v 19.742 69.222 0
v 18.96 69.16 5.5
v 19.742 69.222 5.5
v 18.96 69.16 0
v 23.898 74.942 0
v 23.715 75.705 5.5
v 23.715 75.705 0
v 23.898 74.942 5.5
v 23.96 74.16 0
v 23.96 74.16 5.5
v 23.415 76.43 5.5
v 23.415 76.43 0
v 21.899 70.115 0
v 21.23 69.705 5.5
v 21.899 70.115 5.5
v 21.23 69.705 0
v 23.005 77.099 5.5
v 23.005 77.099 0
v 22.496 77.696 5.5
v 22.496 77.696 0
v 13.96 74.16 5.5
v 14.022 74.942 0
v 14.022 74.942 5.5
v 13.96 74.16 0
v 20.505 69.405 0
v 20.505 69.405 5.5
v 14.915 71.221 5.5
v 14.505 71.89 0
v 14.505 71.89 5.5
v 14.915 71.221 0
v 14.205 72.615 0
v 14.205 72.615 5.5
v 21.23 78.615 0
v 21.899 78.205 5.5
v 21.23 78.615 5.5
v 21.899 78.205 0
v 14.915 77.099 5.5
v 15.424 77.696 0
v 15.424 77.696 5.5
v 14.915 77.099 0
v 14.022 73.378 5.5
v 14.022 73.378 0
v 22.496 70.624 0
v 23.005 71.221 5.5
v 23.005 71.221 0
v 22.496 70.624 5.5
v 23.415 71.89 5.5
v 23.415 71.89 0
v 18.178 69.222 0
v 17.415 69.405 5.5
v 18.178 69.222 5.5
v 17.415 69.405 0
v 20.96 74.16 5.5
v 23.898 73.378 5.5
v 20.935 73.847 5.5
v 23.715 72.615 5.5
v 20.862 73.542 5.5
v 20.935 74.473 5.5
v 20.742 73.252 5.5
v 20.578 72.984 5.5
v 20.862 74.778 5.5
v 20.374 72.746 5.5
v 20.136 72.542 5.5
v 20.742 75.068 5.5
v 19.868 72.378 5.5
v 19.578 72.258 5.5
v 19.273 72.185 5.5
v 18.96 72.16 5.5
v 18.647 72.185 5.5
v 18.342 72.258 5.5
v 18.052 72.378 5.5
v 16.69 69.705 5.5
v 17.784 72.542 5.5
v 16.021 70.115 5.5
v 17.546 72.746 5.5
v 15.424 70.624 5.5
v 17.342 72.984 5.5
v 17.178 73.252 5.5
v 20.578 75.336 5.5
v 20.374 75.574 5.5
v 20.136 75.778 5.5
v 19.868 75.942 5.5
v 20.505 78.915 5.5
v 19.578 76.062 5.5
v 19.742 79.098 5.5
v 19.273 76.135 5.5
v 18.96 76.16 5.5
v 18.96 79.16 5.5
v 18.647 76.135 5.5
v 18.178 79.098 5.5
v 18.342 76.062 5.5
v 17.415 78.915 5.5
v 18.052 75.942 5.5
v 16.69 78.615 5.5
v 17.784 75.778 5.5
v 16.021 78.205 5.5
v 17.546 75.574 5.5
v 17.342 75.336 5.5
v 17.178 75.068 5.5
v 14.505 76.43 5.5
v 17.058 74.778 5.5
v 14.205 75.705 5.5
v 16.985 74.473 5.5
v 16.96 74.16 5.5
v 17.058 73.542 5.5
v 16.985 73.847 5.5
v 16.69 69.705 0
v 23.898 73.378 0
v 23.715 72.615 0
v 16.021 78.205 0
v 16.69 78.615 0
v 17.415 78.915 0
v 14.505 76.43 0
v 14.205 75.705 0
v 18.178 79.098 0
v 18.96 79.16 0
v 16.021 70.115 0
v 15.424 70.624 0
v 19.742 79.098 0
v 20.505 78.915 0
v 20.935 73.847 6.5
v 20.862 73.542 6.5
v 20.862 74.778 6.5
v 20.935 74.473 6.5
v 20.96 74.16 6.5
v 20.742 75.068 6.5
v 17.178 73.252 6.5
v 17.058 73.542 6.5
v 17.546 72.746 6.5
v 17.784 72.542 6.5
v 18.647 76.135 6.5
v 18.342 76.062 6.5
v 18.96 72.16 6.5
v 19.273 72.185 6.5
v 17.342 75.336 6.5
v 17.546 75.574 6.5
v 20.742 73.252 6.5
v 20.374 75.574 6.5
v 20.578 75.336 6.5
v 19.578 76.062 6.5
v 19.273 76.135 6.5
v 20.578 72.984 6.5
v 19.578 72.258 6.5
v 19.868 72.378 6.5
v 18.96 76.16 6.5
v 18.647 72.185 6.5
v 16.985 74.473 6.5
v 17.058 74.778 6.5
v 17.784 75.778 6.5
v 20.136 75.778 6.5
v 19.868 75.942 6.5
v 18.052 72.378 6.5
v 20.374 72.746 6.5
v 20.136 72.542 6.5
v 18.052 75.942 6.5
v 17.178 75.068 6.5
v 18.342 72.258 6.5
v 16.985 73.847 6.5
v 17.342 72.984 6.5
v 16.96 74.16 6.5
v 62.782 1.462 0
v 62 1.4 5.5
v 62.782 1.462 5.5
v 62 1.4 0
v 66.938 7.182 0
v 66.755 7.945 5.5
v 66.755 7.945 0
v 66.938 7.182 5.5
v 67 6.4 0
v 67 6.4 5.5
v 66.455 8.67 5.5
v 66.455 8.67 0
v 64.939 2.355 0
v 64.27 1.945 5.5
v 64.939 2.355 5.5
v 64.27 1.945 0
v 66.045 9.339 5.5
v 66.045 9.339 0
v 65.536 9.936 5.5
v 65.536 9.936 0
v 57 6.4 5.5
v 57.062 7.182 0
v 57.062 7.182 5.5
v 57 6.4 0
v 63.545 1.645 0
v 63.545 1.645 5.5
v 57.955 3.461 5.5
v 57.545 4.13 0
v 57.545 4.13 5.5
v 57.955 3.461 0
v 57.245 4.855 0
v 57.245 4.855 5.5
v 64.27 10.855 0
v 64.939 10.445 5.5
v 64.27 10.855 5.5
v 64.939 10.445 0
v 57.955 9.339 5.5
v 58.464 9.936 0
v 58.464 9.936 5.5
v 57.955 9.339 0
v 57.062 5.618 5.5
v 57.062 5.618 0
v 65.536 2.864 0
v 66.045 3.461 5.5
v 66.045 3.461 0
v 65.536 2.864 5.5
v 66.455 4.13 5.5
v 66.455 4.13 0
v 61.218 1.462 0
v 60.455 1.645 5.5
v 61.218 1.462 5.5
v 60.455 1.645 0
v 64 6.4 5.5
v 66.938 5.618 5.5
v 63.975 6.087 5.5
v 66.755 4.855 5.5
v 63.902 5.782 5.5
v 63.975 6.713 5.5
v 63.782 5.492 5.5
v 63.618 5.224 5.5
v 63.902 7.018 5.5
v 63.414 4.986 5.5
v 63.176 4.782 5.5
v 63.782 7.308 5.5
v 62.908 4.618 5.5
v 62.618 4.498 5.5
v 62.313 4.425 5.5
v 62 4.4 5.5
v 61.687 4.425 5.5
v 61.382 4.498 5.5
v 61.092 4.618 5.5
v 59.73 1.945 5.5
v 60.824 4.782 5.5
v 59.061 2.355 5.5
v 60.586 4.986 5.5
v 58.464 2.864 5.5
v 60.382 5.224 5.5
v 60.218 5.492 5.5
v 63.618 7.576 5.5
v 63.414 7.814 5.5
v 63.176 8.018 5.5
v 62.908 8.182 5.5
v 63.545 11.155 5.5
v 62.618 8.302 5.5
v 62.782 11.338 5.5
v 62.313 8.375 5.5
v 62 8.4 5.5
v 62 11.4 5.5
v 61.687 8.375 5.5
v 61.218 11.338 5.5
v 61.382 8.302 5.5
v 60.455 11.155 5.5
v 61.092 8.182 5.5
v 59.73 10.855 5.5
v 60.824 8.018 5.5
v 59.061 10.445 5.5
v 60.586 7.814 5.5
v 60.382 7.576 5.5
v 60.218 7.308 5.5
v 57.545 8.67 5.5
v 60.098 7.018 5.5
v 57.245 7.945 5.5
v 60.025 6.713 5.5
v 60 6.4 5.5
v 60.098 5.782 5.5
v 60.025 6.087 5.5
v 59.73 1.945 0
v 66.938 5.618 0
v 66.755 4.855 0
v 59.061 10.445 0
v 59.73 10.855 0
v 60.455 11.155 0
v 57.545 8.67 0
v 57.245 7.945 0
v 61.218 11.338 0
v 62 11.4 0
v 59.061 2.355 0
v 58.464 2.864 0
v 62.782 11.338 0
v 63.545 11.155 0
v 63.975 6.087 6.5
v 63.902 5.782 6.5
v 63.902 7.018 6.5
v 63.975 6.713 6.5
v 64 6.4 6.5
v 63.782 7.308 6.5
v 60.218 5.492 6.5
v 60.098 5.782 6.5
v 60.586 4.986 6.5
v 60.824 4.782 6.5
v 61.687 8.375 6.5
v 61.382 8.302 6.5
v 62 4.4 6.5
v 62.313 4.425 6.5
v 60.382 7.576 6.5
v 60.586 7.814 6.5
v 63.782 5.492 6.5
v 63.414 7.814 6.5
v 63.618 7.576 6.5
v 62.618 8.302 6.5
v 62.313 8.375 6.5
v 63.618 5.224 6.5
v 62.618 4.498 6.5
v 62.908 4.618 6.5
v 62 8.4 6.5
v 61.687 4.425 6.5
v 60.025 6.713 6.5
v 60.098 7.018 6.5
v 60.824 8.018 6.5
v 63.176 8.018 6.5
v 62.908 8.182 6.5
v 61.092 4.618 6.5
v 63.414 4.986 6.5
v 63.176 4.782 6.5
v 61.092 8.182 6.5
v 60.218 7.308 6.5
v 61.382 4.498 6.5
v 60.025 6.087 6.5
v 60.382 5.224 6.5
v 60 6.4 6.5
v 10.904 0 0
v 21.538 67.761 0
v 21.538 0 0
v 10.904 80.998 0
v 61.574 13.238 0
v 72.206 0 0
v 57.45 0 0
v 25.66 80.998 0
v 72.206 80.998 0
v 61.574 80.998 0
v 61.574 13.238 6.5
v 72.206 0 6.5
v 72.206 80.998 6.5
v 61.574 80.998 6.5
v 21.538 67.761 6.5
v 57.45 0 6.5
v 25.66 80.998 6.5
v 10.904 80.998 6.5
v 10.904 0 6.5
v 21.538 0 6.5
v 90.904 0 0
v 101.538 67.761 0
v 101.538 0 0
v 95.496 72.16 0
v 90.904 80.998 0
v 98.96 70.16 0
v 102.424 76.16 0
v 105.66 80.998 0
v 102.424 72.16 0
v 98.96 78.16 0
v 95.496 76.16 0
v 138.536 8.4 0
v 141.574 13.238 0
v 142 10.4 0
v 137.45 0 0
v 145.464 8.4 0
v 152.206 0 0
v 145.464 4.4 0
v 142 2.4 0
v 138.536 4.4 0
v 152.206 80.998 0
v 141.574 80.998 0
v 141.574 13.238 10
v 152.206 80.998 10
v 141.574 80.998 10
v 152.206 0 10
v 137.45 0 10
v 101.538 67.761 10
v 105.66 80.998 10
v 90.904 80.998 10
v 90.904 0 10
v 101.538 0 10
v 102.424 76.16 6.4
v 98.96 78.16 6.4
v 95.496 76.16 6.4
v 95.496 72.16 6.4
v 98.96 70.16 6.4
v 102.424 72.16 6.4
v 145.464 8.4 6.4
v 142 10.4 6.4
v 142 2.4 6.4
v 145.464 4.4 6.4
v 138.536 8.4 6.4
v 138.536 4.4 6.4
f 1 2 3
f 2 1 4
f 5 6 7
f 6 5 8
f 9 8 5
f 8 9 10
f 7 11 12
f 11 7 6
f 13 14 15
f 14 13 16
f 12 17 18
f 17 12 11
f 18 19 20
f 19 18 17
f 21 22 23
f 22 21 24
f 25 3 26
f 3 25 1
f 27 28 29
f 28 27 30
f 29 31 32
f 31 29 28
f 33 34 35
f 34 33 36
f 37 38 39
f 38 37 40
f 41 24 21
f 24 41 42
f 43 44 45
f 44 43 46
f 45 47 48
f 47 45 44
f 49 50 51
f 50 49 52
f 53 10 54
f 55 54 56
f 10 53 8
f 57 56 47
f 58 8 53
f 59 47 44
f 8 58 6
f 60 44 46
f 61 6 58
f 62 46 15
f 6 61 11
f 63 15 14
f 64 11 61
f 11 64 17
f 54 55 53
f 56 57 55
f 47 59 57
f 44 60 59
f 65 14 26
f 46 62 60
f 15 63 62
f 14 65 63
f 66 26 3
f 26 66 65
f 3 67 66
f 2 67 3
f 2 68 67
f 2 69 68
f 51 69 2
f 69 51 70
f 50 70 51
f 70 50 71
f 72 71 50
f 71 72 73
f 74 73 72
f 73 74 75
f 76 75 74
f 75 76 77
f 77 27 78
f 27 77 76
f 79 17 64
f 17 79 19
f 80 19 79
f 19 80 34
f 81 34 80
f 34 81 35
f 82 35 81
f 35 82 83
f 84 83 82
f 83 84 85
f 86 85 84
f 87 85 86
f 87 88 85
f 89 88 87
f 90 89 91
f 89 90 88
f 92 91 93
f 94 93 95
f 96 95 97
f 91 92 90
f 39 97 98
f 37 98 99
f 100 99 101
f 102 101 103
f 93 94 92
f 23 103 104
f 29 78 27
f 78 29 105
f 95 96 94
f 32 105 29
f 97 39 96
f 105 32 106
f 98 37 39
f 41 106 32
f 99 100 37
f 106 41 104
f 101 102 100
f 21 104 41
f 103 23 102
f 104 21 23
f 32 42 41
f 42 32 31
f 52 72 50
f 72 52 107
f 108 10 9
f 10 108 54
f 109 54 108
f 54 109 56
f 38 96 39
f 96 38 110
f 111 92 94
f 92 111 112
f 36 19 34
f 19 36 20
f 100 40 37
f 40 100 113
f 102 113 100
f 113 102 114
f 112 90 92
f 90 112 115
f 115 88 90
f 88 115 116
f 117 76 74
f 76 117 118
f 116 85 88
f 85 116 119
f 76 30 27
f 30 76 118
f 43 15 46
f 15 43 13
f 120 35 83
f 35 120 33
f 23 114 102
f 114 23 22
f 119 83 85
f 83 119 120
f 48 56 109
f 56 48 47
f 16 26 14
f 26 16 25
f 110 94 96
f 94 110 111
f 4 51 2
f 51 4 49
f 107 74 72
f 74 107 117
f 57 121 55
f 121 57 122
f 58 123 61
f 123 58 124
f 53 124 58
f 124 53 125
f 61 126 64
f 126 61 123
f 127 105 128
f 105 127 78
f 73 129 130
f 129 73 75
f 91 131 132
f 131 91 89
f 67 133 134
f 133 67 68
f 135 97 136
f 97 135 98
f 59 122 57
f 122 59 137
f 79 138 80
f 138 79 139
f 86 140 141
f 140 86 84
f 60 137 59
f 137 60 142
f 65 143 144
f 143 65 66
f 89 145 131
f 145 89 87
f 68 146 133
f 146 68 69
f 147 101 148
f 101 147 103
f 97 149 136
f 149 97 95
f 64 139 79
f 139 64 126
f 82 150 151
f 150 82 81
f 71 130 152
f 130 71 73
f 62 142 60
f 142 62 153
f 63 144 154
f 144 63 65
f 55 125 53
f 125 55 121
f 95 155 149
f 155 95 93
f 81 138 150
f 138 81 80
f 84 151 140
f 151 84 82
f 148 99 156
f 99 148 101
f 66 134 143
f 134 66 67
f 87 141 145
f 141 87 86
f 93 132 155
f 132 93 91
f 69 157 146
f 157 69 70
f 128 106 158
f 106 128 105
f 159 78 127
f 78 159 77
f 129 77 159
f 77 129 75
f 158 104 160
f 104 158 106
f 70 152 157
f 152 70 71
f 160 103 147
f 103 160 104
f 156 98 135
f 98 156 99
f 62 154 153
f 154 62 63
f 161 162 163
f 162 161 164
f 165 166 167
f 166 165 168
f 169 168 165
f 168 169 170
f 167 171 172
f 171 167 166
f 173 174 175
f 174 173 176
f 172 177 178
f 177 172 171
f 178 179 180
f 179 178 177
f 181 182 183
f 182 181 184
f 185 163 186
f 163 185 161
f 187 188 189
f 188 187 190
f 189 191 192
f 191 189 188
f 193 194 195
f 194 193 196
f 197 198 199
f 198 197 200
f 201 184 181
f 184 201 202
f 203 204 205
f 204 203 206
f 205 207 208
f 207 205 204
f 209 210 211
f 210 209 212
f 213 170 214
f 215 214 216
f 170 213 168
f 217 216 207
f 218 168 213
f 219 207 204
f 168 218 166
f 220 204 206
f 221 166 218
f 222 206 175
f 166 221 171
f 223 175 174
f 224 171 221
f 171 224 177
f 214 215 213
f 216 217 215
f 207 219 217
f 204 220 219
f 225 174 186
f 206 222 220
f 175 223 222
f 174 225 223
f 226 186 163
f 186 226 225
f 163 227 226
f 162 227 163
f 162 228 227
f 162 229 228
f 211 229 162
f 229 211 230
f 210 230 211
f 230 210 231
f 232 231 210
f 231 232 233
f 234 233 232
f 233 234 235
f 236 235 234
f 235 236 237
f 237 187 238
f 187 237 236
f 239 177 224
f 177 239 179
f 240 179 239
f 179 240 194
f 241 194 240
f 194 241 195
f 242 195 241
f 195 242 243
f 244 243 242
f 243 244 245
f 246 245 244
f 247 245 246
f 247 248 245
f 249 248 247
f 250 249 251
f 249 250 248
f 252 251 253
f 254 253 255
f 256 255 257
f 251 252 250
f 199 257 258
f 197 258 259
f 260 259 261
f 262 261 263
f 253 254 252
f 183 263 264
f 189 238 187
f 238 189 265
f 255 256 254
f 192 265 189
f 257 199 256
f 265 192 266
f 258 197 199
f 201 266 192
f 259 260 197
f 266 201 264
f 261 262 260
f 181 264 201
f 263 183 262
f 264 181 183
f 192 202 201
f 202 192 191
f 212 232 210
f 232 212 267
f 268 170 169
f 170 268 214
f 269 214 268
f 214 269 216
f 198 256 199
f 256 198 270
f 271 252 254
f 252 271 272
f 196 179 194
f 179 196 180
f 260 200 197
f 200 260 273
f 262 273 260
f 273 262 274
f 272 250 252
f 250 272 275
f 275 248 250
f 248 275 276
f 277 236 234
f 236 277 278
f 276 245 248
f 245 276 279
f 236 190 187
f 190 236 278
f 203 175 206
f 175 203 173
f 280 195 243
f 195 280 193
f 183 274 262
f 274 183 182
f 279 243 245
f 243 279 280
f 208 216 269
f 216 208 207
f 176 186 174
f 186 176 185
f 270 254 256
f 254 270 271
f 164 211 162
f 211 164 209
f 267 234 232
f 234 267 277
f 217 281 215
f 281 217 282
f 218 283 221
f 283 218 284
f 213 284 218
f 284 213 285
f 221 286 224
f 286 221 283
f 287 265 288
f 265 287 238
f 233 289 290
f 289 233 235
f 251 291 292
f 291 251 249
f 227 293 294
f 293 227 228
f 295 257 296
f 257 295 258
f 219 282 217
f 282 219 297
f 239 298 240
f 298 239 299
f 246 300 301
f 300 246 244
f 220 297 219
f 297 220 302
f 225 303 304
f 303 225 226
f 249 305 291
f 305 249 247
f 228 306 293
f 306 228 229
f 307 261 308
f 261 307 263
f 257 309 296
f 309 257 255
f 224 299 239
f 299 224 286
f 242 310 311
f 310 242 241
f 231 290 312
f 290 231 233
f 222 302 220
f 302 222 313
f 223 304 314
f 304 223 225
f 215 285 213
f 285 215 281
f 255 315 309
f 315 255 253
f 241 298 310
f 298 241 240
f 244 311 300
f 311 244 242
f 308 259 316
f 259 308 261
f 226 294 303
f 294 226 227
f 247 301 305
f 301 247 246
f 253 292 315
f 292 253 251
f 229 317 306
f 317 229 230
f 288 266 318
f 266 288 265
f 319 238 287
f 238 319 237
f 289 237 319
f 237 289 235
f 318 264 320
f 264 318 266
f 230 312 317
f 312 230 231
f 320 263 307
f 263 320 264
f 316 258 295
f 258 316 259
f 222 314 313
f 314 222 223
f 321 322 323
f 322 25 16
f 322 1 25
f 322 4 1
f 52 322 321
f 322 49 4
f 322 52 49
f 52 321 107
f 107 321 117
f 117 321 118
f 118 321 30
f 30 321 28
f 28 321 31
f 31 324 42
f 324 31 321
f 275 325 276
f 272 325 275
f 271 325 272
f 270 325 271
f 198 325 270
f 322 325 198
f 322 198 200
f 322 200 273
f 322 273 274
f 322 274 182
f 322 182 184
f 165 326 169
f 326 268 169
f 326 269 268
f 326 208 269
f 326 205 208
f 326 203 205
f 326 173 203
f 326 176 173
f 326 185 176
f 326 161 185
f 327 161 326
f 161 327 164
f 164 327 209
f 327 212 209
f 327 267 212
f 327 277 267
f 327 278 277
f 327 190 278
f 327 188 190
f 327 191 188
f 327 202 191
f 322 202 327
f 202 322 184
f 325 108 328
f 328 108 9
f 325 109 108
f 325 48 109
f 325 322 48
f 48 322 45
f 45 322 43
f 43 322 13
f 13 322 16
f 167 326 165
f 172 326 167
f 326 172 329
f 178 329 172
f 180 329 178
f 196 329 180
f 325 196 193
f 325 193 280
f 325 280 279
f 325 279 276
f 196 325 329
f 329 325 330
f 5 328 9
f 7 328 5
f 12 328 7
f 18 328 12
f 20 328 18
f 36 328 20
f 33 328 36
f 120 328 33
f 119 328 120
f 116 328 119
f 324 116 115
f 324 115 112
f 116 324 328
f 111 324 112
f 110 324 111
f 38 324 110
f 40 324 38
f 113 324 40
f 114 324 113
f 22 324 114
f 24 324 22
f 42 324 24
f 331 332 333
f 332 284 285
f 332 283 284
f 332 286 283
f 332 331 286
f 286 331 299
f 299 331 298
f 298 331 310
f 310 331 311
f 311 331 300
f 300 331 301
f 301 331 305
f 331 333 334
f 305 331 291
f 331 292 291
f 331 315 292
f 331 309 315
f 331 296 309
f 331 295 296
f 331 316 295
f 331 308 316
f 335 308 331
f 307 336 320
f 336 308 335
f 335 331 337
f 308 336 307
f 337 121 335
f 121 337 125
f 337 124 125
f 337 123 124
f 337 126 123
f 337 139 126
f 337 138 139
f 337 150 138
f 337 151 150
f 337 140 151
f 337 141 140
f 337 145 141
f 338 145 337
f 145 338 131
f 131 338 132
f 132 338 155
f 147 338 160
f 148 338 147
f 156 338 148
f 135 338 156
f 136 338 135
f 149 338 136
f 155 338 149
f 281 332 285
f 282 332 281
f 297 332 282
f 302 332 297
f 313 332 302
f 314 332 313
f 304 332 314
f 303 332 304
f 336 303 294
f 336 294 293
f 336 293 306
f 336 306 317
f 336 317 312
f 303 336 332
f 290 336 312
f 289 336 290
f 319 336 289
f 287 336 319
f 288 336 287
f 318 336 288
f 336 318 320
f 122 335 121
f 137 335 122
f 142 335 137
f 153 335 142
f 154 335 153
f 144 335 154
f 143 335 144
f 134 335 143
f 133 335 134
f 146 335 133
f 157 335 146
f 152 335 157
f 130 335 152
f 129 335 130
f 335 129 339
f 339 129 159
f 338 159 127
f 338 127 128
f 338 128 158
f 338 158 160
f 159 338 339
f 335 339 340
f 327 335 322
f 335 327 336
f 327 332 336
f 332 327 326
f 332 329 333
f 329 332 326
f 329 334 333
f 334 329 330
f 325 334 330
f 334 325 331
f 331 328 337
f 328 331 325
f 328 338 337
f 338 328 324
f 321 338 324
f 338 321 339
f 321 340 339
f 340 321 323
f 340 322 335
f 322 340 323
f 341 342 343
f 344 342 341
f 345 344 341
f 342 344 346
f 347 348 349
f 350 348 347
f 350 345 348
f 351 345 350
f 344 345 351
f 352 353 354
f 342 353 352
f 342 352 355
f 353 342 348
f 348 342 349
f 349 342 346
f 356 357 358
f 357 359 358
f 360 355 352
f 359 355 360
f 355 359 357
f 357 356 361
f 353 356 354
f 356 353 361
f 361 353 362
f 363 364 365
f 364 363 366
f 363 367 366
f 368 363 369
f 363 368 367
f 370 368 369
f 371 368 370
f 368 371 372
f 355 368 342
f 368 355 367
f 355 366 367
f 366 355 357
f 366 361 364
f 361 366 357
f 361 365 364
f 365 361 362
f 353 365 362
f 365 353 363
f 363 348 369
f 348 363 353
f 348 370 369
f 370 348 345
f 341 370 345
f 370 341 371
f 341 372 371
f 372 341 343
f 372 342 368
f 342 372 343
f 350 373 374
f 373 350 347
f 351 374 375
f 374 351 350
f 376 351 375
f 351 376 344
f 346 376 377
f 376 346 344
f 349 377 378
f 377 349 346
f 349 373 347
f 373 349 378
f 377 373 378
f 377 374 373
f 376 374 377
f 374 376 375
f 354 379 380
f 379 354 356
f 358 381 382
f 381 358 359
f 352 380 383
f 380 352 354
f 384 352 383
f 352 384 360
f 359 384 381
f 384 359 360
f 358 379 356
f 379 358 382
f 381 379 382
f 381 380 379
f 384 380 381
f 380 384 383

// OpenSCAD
wall           =  1;
text_size      = 80;
//text_font      = "Liberation Sans:style=Bold";
text_font      = "Calibre";

magnet_height1 =   4.5;
magnet_height2 =  12.5;
magnet_diam    =  10;
screw_diam     =   4;
nut_height     =   3.2;
nut_diam       =   8;
$fn            =  40;

screw_height = magnet_height2-magnet_height1;
nut_radius   = 0.5 * nut_diam;

module hexagon(radius) {
    polygon(
        points = [
            [radius * sin(0*60), radius * cos(0*60)],
            [radius * sin(1*60), radius * cos(1*60)],
            [radius * sin(2*60), radius * cos(2*60)],
            [radius * sin(3*60), radius * cos(3*60)],
            [radius * sin(4*60), radius * cos(4*60)],
            [radius * sin(5*60), radius * cos(5*60)]
        ]
    );
}

module nut(radius, height) {
    linear_extrude(height) {
        hexagon(radius);
    };
}

module screw() {
    cylinder( d = screw_diam, h = screw_height );
}

module magnet() {
    cylinder( d = magnet_diam, h = magnet_height1+2 );
    translate([0, 0, magnet_height1]) screw();
}

module magnet_complet() {
    translate([0, 0, -1])
        magnet();
    translate([0, 0, magnet_height2-nut_height])
        nut(nut_radius, nut_height+1);
    translate([0, 0, magnet_height2])
        nut(nut_radius, nut_height+1);
}

module A_magnet() {
    difference() {
        linear_extrude( magnet_height1+wall+1 )
            text("A", size = text_size, font=text_font);
        translate([0.732*text_size, 0.330*text_size, 0])
            magnet_complet();
        translate([0.225*text_size, 0.330*text_size, 0])
            magnet_complet();
    }
}

module A_cover() {
    difference() {
        linear_extrude( screw_height+wall+1 )
            text("A", size = text_size, font=text_font);
        
        translate([0.732*text_size, 0.330*text_size, -1])
            nut(nut_radius, 2*nut_height+1);
        translate([0.225*text_size, 0.330*text_size, -1])
            nut(nut_radius, 2*nut_height+1);
    }
}


module A_carka_magnet() {
    difference() {
        union() {
            linear_extrude( magnet_height1+wall+1 )
                text("A", size = text_size, font=text_font);
            
            translate([-0.15*text_size, 0.71*text_size, 0])
            rotate([0, 0, -45])
            linear_extrude( magnet_height1+wall+1 )
                text("'", size = text_size, font=text_font);
        }
        translate([0.732*text_size, 0.330*text_size, 0])
            magnet_complet();
        translate([0.225*text_size, 0.330*text_size, 0])
            magnet_complet();
    }
}

module A_carka_cover() {
    difference() {
        union() {
            linear_extrude( screw_height+wall+1 )
                text("A", size = text_size, font=text_font);

            translate([-0.15*text_size, 0.71*text_size, 0])
            rotate([0, 0, -45])
            linear_extrude( screw_height+wall+1 )
                text("'", size = text_size, font=text_font);
            }
        
        translate([0.732*text_size, 0.330*text_size, -1])
            nut(nut_radius, 2*nut_height+1);
        translate([0.225*text_size, 0.330*text_size, -1])
            nut(nut_radius, 2*nut_height+1);
    }
}

module B_magnet() {
    difference() {
        linear_extrude( magnet_height1+wall+1 )
            text("B", size = text_size, font=text_font);
        translate([0.205*text_size, 0.93*text_size, 0])
            magnet_complet();
        translate([0.205*text_size, 0.07*text_size, 0])
            magnet_complet();
    }
}

module B_cover() {
    difference() {
        linear_extrude( screw_height+wall+1 )
            text("B", size = text_size, font=text_font);
        
        translate([0.205*text_size, 0.93*text_size, -1])
            nut(nut_radius, 2*nut_height+1);
        translate([0.205*text_size, 0.07*text_size, -1])
            nut(nut_radius, 2*nut_height+1);
    }
}


module E_magnet() {
    difference() {
        linear_extrude( magnet_height1+wall+1 )
            text("E", size = text_size, font=text_font);
        translate([0.209*text_size, 0.08*text_size, 0])
            magnet_complet();
        translate([0.209*text_size, 0.94*text_size, 0])
            magnet_complet();
    }
}

module E_cover() {
    difference() {
        linear_extrude( screw_height+wall+1 )
            text("E", size = text_size, font=text_font);
        translate([0.209*text_size, 0.08*text_size, -1])
            nut(nut_radius, 2*nut_height+1);
        translate([0.209*text_size, 0.94*text_size, -1])
            nut(nut_radius, 2*nut_height+1);
    }
}

module E_hacek_magnet() {
    difference() {
        union() {
            linear_extrude( magnet_height1+wall+1 )
                text("E", size = text_size, font=text_font);
            translate([0.1*text_size, 0.1*text_size, 0])
            linear_extrude( magnet_height1+wall+1 )
                text("ˇ", size = text_size, font=text_font);
        }
        translate([0.209*text_size, 0.08*text_size, 0])
            magnet_complet();
        translate([0.209*text_size, 0.94*text_size, 0])
            magnet_complet();
    }
}

module E_hacek_cover() {
    difference() {
        union() {
            linear_extrude( screw_height+wall+1 )
                text("E", size = text_size, font=text_font);
            translate([0.1*text_size, 0.1*text_size, 0])
            linear_extrude( screw_height+wall+1 )
                text("ˇ", size = text_size, font=text_font);
        }
        translate([0.209*text_size, 0.08*text_size, -1])
            nut(nut_radius, 2*nut_height+1);
        translate([0.209*text_size, 0.94*text_size, -1])
            nut(nut_radius, 2*nut_height+1);
    }
}

module H_magnet() {
    difference() {
        linear_extrude( magnet_height1+wall+1 )
            text("H", size = text_size, font=text_font);
        translate([0.205*text_size, 0.54*text_size, 0])
            magnet_complet();
        translate([0.83*text_size, 0.54*text_size, 0])
            magnet_complet();
    }
}

module H_cover() {
    difference() {
        linear_extrude( screw_height+wall+1 )
            text("H", size = text_size, font=text_font);
        translate([0.205*text_size, 0.54*text_size, -1])
            nut(nut_radius, 2*nut_height+1);
        translate([0.83*text_size, 0.54*text_size, -1])
            nut(nut_radius, 2*nut_height+1);
    }
}


module I_carka_magnet() {
    difference() {
        union() {
            linear_extrude( magnet_height1+wall+1 )
                text("I", size = text_size, font=text_font);
            translate([-0.40*text_size, 0.7*text_size, 0])
            rotate([0, 0, -45])
            linear_extrude( magnet_height1+wall+1 )
                text("'", size = text_size, font=text_font);
        }
        translate([0.205*text_size, 0.07*text_size, 0])
            magnet_complet();
        translate([0.205*text_size, 0.93*text_size, 0])
            magnet_complet();
    }
}

module I_carka_cover() {
    difference() {
        union() {
            linear_extrude( screw_height+wall+1 )
                text("I", size = text_size, font=text_font);
            translate([-0.40*text_size, 0.7*text_size, 0])
            rotate([0, 0, -45])
            linear_extrude( screw_height+wall+1 )
                text("'", size = text_size, font=text_font);
        }
        translate([0.205*text_size, 0.07*text_size, -1])
            nut(nut_radius, 2*nut_height+1);
        translate([0.205*text_size, 0.93*text_size, -1])
            nut(nut_radius, 2*nut_height+1);
    }
}


module K_magnet() {
    difference() {
        linear_extrude( magnet_height1+wall+1 )
            text("K", size = text_size, font=text_font);
        translate([0.205*text_size, 0.10*text_size, 0])
            magnet_complet();
        translate([0.205*text_size, 0.90*text_size, 0])
            magnet_complet();
    }
}

module K_cover() {
    difference() {
        linear_extrude( screw_height+wall+1 )
            text("K", size = text_size, font=text_font);
        translate([0.205*text_size, 0.10*text_size, -1])
            nut(nut_radius, 2*nut_height+1);
        translate([0.205*text_size, 0.90*text_size, -1])
            nut(nut_radius, 2*nut_height+1);
    }
}

module L_magnet() {
    difference() {
        linear_extrude( magnet_height1+wall+1 )
            text("L", size = text_size, font=text_font);
        translate([0.205*text_size, 0.93*text_size, 0])
            magnet_complet();
        translate([0.205*text_size, 0.07*text_size, 0])
            magnet_complet();
    }
}

module L_cover() {
    difference() {
        linear_extrude( screw_height+wall+1 )
            text("L", size = text_size, font=text_font);
        translate([0.205*text_size, 0.93*text_size, -1])
            nut(nut_radius, 2*nut_height+1);
        translate([0.205*text_size, 0.07*text_size, -1])
            nut(nut_radius, 2*nut_height+1);
    }
}


module M_magnet() {
    difference() {
        linear_extrude( magnet_height1+wall+1 )
            text("M", size = text_size, font=text_font);
        translate([0.215*text_size, 0.94*text_size, 0])
            magnet_complet();
        translate([0.99*text_size, 0.94*text_size, 0])
            magnet_complet();
    }
}

module M_cover() {
    difference() {
        linear_extrude( screw_height+wall+1 )
            text("M", size = text_size, font=text_font);
        translate([0.215*text_size, 0.94*text_size, -1])
            nut(nut_radius, 2*nut_height+1);
        translate([0.99*text_size, 0.94*text_size, -1])
            nut(nut_radius, 2*nut_height+1);
    }
}

module N_magnet() {
    difference() {
        linear_extrude( magnet_height1+wall+1 )
            text("N", size = text_size, font=text_font);
        translate([0.237*text_size, 0.927*text_size, 0])
            magnet_complet();
        translate([0.775*text_size, 0.080*text_size, 0])
            magnet_complet();
    }
}

module N_cover() {
    difference() {
        linear_extrude( screw_height+wall+1 )
            text("N", size = text_size, font=text_font);
        translate([0.237*text_size, 0.927*text_size, -1])
            nut(nut_radius, 2*nut_height+1);
        translate([0.775*text_size, 0.080*text_size, -1])
            nut(nut_radius, 2*nut_height+1);
    }
}

module O_magnet() {
    difference() {
        linear_extrude( magnet_height1+wall+1 )
            text("O", size = text_size, font=text_font);
        translate([0.15*text_size, 0.5*text_size, 0])
            magnet_complet();
        translate([0.94*text_size, 0.5*text_size, 0])
            magnet_complet();
    }
}

module O_cover() {
    difference() {
        linear_extrude( screw_height+wall+1 )
            text("O", size = text_size, font=text_font);
        translate([0.15*text_size, 0.5*text_size, -1])
            nut(nut_radius, 2*nut_height+1);
        translate([0.94*text_size, 0.5*text_size, -1])
            nut(nut_radius, 2*nut_height+1);
    }
}

module S_magnet() {
    difference() {
        linear_extrude( magnet_height1+wall+1 )
            text("S", size = text_size, font=text_font);
        translate([0.16*text_size, 0.75*text_size, 0])
            magnet_complet();
        translate([0.731*text_size, 0.27*text_size, 0])
            magnet_complet();
    }
}

module S_cover() {
    difference() {
        linear_extrude( screw_height+wall+1 )
            text("S", size = text_size, font=text_font);
        translate([0.16*text_size, 0.75*text_size, -1])
            nut(nut_radius, 2*nut_height+1);
        translate([0.731*text_size, 0.27*text_size, -1])
            nut(nut_radius, 2*nut_height+1);
    }
}



module T_magnet() {
    difference() {
        linear_extrude( magnet_height1+wall+1 )
            text("T", size = text_size, font=text_font);
        translate([0.425*text_size, 0.94*text_size, 0])
            magnet_complet();
        translate([0.425*text_size, 0.08*text_size, 0])
            magnet_complet();
    }
}

module T_cover() {
    difference() {
        linear_extrude( screw_height+wall+1 )
            text("T", size = text_size, font=text_font);
        translate([0.425*text_size, 0.94*text_size, -1])
            nut(nut_radius, 2*nut_height+1);
        translate([0.425*text_size, 0.08*text_size, -1])
            nut(nut_radius, 2*nut_height+1);
    }
}


module U_magnet() {
    difference() {
        linear_extrude( magnet_height1+wall+1 )
            text("U", size = text_size, font=text_font);
        translate([0.189*text_size, 0.54*text_size, 0])
            magnet_complet();
        translate([0.8275*text_size, 0.54*text_size, 0])
            magnet_complet();
    }
}

module U_cover() {
    difference() {
        linear_extrude( screw_height+wall+1 )
            text("U", size = text_size, font=text_font);
        translate([0.189*text_size, 0.54*text_size, -1])
            nut(nut_radius, 2*nut_height+1);
        translate([0.8275*text_size, 0.54*text_size, -1])
            nut(nut_radius, 2*nut_height+1);
    }
}


module V_magnet() {
    difference() {
        linear_extrude( magnet_height1+wall+1 )
            text("V", size = text_size, font=text_font);
        translate([0.1145*text_size, 0.93*text_size, 0])
            magnet_complet();
        translate([0.836*text_size, 0.93*text_size, 0])
            magnet_complet();
    }
}

module V_cover() {
    difference() {
        linear_extrude( screw_height+wall+1 )
            text("V", size = text_size, font=text_font);
        translate([0.1145*text_size, 0.93*text_size, -1])
            nut(nut_radius, 2*nut_height+1);
        translate([0.836*text_size, 0.93*text_size, -1])
            nut(nut_radius, 2*nut_height+1);
    }
}


module Z_hacek_magnet() {
    difference() {
        union() {
            linear_extrude( magnet_height1+wall+1 )
                text("Z", size = text_size, font=text_font);
            translate([ 0.1*text_size, 0.1*text_size, 0])
            linear_extrude( magnet_height1+wall+1 )
                text("ˇ", size = text_size, font=text_font);
        }
        translate([0.78*text_size, 0.93*text_size, 0])
            magnet_complet();
        translate([0.15*text_size, 0.08*text_size, 0])
            magnet_complet();
    }
}

module Z_hacek_cover() {
    difference() {
        union() {
            linear_extrude( screw_height+wall+1 )
                text("Z", size = text_size, font=text_font);
            translate([ 0.1*text_size, 0.1*text_size, 0])
            linear_extrude( screw_height+wall+1 )
                text("ˇ", size = text_size, font=text_font);
        }
        translate([0.78*text_size, 0.93*text_size, -1])
            nut(nut_radius, 2*nut_height+1);
        translate([0.15*text_size, 0.08*text_size, -1])
            nut(nut_radius, 2*nut_height+1);
    }
}



//A
//translate([0*text_size, 0*text_size, 0]) A_magnet();
//translate([1.0*text_size, 0*text_size, 0]) A_cover();

//A_carka
//translate([0*text_size, 0*text_size, 0]) A_carka_magnet();
//translate([1.0*text_size, 0*text_size, 0]) A_carka_cover();

//B
//translate([0*text_size, 0*text_size, 0]) B_magnet();
//translate([0.8*text_size, 0*text_size, 0]) B_cover();

//E
//translate([0*text_size, 0*text_size, 0]) E_magnet();
//translate([0.85*text_size, 0*text_size, 0]) E_cover();

//E_hacek
//translate([0*text_size, 0*text_size, 0]) E_hacek_magnet();
//translate([0.85*text_size, 0*text_size, 0]) E_hacek_cover();

//H
//translate([0*text_size, 0*text_size, 0]) H_magnet();
//translate([0.85*text_size, 0*text_size, 0]) H_cover();

//I_carka
//translate([0*text_size, 0*text_size, 0]) I_carka_magnet();
//translate([0.8*text_size, 0*text_size, 0]) I_carka_cover();

//K
//translate([0*text_size, 0*text_size, 0]) K_magnet();
//translate([0.85*text_size, 0*text_size, 0]) K_cover();

//L
//translate([0.0*text_size, 0*text_size, 0]) L_magnet();
//translate([0.8*text_size, 0*text_size, 0]) L_cover();

//M
//translate([0*text_size, 0*text_size, 0]) M_magnet();
//translate([1.0*text_size, 0*text_size, 0]) M_cover();

//N
translate([0*text_size, 0*text_size, 0]) N_magnet();
translate([1.0*text_size, 0*text_size, 0]) N_cover();

//O
//translate([0*text_size, 0*text_size, 0]) O_magnet();
//translate([1.1*text_size, 0*text_size, 0]) O_cover();

//S
//translate([0*text_size, 0*text_size, 0]) S_magnet();
//translate([0.85*text_size, 0*text_size, 0]) S_cover();

//T
//translate([0*text_size, 0*text_size, 0]) T_magnet();
//translate([1.0*text_size, 0*text_size, 0]) T_cover();

//U
//translate([0*text_size, 0*text_size, 0]) U_magnet();
//translate([0.85*text_size, 0*text_size, 0]) U_cover();

//V
//translate([0*text_size, 0*text_size, 0]) V_magnet();
//translate([1.0*text_size, 0*text_size, 0]) V_cover();

//Z_hacek
//translate([0*text_size, 0*text_size, 0]) Z_hacek_magnet();
//translate([1.0*text_size, 0*text_size, 0]) Z_hacek_cover();
